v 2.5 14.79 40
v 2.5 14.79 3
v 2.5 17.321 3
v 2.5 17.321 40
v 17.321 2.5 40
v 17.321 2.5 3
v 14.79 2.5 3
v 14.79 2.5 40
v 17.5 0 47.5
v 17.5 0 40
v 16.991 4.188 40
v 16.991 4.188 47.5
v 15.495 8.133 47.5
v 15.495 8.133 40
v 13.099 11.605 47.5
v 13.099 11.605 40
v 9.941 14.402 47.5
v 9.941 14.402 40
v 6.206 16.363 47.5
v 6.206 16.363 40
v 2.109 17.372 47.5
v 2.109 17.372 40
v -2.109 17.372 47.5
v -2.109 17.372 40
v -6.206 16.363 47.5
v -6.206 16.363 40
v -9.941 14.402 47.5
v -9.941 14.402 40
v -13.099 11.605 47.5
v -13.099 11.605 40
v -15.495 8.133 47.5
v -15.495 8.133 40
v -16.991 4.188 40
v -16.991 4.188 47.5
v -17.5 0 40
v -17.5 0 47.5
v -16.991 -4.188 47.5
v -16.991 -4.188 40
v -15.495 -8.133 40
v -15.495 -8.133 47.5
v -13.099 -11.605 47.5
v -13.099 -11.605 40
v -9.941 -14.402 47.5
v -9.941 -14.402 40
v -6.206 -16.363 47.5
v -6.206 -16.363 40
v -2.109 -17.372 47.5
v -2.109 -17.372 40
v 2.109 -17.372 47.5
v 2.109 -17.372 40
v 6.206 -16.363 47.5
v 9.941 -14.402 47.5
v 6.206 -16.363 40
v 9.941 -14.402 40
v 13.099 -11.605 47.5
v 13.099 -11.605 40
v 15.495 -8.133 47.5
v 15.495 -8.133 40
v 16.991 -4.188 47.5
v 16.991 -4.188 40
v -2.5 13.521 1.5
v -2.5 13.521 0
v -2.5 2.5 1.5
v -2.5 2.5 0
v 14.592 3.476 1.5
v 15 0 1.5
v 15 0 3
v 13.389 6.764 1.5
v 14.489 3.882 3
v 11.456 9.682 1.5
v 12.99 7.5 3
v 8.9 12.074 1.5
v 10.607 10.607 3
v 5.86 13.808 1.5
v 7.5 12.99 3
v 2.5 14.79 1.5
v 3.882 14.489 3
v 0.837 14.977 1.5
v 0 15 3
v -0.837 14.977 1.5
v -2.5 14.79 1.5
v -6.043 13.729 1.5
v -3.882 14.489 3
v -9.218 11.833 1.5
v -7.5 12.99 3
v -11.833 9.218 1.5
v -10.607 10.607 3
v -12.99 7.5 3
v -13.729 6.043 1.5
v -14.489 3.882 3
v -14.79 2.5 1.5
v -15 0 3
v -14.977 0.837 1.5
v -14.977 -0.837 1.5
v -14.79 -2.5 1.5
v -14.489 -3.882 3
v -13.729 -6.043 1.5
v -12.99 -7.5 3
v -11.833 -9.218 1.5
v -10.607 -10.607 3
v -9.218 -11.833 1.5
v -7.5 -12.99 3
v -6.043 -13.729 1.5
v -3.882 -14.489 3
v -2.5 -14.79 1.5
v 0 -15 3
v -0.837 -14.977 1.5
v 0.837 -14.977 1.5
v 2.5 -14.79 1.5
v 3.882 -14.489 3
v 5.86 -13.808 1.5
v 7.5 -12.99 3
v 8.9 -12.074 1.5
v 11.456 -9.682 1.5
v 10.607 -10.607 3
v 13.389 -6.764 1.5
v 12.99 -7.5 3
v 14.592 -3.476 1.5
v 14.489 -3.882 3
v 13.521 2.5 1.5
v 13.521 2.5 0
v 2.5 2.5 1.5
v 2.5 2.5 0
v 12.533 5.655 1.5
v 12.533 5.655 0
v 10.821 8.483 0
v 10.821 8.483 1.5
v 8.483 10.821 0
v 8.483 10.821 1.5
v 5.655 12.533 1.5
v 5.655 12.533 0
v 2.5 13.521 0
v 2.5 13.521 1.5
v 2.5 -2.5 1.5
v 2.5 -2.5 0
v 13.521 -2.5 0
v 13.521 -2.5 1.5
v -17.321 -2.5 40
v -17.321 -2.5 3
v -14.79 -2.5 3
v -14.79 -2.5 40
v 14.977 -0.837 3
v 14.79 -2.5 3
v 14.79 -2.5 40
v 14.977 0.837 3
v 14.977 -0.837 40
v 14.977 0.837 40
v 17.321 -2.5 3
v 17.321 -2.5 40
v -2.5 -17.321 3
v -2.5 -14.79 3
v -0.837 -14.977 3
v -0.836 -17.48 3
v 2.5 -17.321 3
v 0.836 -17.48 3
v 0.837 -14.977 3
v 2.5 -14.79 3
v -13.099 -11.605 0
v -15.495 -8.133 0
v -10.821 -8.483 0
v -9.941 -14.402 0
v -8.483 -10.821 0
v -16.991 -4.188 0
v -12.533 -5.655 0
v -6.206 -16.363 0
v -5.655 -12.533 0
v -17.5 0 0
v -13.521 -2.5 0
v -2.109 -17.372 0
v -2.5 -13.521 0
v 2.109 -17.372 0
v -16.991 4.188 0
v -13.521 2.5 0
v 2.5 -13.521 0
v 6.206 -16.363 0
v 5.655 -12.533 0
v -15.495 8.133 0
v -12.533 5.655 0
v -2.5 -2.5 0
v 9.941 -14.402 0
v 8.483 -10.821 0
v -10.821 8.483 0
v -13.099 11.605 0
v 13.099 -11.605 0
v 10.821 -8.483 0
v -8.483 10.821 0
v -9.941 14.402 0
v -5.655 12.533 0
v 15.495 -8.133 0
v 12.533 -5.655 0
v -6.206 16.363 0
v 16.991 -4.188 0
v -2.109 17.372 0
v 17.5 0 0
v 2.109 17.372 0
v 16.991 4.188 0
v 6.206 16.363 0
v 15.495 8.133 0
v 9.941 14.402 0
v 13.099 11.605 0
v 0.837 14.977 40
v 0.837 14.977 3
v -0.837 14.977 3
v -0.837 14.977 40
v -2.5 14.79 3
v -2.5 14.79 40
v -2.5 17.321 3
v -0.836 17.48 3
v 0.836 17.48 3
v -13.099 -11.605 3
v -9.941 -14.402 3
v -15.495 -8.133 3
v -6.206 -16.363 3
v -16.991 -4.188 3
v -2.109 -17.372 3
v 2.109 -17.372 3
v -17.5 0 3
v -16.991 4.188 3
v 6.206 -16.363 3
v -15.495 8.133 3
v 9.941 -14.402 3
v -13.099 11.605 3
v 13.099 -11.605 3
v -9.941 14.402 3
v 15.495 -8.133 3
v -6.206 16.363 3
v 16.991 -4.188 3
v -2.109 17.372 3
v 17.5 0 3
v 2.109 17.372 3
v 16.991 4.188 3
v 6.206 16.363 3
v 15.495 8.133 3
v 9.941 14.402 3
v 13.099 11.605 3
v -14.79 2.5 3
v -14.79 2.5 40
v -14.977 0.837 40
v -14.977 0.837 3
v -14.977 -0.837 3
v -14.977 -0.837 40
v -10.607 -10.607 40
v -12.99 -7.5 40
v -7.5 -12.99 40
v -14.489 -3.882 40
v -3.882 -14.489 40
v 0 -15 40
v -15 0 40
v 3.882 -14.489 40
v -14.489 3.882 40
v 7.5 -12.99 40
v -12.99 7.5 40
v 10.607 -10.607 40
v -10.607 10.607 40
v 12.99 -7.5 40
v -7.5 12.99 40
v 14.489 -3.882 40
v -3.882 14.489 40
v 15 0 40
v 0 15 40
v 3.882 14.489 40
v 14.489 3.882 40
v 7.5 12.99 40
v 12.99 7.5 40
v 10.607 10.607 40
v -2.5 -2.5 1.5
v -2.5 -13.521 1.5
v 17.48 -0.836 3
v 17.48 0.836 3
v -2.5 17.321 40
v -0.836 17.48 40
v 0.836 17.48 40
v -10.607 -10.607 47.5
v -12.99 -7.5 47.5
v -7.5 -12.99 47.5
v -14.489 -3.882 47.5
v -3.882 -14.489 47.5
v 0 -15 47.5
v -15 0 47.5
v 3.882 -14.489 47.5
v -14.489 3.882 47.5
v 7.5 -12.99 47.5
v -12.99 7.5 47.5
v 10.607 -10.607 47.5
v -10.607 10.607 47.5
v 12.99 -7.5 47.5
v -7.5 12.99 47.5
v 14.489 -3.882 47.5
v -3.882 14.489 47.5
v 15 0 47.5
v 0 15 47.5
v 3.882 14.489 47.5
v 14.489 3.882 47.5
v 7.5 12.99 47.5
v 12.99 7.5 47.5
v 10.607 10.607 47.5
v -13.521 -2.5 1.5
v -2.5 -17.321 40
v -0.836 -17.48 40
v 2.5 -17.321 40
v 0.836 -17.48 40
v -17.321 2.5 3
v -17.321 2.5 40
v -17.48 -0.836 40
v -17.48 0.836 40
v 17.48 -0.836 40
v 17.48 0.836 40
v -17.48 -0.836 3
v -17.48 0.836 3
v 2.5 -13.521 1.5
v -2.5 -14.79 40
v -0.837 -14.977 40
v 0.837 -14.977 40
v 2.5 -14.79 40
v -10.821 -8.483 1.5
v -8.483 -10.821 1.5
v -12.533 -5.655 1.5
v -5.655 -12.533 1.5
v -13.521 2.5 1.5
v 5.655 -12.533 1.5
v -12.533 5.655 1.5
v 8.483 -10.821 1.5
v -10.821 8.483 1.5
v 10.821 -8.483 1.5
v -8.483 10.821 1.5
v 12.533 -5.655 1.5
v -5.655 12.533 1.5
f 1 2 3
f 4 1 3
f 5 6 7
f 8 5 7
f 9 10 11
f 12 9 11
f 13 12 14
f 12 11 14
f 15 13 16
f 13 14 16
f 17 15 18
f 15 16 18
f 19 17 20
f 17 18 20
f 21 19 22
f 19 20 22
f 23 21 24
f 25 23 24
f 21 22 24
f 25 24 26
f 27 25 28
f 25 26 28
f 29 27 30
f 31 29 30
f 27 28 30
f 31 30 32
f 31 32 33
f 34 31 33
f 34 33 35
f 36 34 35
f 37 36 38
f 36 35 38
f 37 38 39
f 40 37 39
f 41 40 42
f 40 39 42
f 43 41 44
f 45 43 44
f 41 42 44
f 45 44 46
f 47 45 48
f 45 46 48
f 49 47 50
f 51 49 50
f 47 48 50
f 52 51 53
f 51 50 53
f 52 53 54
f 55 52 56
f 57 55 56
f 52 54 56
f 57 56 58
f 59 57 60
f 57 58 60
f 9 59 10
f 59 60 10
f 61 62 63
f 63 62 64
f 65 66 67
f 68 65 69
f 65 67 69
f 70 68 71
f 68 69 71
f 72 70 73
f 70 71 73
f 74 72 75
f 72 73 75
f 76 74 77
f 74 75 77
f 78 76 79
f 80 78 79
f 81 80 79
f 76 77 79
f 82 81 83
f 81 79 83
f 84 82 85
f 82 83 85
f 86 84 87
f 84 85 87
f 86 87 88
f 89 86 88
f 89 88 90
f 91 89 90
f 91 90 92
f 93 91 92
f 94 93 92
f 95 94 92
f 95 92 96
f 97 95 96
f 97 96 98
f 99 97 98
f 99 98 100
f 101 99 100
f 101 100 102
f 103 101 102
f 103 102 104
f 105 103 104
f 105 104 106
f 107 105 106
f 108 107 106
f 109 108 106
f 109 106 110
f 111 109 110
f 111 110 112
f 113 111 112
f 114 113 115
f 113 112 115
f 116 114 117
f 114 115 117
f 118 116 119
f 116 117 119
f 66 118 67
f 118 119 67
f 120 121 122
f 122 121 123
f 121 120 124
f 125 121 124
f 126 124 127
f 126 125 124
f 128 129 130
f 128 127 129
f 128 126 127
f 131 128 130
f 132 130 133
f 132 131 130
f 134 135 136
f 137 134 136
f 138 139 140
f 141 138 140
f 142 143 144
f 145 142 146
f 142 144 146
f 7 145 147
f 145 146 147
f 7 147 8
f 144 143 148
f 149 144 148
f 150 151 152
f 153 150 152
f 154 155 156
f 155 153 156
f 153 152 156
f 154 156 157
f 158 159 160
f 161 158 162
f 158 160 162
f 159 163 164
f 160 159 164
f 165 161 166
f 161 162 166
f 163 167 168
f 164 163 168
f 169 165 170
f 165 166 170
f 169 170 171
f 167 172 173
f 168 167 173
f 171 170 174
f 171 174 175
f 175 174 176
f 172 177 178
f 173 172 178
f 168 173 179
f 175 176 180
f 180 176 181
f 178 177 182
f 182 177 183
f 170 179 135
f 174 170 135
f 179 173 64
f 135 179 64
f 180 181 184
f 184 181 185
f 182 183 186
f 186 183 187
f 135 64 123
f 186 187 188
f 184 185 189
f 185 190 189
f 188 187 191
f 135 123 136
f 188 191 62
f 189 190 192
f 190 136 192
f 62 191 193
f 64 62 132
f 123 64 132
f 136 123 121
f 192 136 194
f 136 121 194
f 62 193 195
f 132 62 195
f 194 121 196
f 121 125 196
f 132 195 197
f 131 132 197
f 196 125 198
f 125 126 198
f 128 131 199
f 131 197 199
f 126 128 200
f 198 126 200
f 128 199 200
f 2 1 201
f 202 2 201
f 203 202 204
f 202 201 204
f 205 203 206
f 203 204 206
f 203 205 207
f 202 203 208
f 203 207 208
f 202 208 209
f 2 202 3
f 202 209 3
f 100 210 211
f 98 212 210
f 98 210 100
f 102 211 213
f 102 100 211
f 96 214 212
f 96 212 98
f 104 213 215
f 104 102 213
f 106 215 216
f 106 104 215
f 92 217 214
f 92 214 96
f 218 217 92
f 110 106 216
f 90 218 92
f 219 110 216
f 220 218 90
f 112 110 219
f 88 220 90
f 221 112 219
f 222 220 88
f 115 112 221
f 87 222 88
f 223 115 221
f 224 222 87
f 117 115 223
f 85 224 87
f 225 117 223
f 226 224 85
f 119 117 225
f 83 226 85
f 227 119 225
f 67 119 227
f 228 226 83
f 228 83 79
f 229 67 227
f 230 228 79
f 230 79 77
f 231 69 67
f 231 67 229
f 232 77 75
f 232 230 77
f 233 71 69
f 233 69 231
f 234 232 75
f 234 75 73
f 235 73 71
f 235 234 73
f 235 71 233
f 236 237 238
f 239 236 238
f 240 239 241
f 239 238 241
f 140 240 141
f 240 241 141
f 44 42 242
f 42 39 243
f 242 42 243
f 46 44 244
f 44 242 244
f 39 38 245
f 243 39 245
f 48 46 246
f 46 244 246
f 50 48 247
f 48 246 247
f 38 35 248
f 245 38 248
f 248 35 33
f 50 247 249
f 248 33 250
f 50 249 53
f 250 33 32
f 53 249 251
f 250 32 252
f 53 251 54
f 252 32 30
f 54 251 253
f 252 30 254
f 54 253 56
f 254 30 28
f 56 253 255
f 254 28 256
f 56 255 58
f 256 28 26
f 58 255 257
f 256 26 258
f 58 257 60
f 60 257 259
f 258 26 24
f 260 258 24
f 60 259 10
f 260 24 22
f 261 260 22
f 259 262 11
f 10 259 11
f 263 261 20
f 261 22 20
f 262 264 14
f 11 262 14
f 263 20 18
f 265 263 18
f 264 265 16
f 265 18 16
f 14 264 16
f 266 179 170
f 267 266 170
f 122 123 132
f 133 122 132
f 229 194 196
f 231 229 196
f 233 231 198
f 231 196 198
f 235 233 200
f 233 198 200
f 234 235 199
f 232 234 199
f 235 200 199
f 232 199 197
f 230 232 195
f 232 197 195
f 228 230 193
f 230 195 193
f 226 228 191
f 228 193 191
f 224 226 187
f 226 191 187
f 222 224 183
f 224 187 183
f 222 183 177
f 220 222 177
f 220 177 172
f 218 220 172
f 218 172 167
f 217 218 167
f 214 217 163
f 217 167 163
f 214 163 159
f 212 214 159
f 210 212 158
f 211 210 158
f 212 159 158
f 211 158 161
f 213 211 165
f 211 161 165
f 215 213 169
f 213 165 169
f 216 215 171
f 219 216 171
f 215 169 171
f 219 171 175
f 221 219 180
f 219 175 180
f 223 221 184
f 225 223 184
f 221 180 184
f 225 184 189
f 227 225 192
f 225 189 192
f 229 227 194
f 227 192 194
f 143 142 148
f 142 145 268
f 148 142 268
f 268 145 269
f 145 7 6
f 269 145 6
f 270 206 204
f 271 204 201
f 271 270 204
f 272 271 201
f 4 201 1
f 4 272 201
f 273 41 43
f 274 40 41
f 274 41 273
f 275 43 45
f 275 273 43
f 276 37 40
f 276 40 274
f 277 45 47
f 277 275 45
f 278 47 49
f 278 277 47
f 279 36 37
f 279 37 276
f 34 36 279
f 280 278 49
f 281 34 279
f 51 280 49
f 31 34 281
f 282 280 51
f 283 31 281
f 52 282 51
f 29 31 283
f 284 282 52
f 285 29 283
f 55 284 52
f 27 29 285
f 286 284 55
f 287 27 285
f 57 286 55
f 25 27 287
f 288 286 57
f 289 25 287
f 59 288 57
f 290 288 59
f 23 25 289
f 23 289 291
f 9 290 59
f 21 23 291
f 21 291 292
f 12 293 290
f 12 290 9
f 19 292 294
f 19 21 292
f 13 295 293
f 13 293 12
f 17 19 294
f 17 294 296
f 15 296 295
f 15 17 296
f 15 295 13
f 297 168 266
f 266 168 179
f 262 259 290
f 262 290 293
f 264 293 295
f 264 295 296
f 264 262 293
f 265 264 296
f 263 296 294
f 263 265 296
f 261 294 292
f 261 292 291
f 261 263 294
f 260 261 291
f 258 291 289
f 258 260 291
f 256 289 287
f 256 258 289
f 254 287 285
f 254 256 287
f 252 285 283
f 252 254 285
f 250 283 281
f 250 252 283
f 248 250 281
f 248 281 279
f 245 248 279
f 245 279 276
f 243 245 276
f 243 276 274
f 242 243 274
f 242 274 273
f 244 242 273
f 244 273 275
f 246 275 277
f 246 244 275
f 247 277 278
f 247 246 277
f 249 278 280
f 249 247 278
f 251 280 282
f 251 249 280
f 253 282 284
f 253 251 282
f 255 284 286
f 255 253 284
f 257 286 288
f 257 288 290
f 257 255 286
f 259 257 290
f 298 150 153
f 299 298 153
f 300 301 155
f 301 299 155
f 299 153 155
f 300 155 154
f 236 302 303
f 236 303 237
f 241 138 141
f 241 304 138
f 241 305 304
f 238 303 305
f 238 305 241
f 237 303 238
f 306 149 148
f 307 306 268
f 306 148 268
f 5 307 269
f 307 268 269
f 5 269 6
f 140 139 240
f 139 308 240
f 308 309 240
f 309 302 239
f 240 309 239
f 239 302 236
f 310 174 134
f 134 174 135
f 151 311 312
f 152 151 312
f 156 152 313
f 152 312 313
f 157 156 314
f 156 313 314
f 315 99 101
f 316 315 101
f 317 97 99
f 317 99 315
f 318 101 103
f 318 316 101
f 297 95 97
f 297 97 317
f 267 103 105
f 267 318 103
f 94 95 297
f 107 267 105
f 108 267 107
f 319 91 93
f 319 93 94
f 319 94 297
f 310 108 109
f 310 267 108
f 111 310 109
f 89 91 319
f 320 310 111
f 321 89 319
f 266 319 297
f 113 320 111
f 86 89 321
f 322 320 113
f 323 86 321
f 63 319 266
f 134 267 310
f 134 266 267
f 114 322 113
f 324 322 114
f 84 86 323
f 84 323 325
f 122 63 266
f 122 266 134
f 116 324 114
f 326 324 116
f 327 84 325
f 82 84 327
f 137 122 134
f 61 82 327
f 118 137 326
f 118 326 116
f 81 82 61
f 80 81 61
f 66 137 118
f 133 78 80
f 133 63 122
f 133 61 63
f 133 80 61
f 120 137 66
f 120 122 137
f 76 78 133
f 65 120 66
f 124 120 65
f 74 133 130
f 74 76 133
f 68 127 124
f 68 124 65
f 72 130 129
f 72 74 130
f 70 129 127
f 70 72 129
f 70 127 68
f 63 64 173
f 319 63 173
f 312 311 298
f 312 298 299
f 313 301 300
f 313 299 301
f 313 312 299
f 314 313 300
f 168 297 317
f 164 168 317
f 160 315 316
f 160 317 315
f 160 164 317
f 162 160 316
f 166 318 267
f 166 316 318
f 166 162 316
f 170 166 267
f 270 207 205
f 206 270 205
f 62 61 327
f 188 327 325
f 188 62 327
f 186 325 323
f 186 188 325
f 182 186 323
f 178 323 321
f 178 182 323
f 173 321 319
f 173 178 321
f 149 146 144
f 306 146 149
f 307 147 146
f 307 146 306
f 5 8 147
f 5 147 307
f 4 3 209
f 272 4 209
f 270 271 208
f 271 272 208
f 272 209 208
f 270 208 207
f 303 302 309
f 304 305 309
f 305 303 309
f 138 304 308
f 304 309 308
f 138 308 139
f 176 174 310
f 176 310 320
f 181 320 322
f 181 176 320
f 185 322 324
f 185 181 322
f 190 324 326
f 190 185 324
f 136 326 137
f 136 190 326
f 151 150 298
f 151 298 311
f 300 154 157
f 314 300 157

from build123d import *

# Parameters (mm, degrees)
F0_R      = 17.5
F0_R_2    = 13.75
F1_DEPTH  = 43
F2_R      = 15
F2_R_2    = 13.75
F3_DEPTH  = 41.5
F5_W      = 34.3430949748
F5_H      = 5
F5_W_2    = 5
F5_H_2    = 31.6730713844
F6_DEPTH  = 37
F7_R      = 17.5
F7_R_2    = 13.75
F8_DEPTH  = 3
F10_R     = 17.5
F10_R_2   = 15
F11_DEPTH = 7.5
F12_R     = 15
F13_DEPTH = 1.5
F14_W     = 5
F14_H     = 5
F15_DEPTH = 1.5


with BuildPart() as f1:
    # F0 (on Top) → F1 (new body)
    with BuildSketch(Plane.XY):
        Circle(F0_R)
        Circle(F0_R_2, mode=Mode.SUBTRACT)
    extrude(amount=F1_DEPTH)

    # F2 (on face) → F3 (cut)
    with BuildSketch(Plane.XY.offset(43)):
        Circle(F2_R)
        Circle(F2_R_2, mode=Mode.SUBTRACT)
    extrude(amount=-F3_DEPTH, mode=Mode.SUBTRACT)

    # F5 (on offset) → F6 (intersect)
    with BuildSketch(Plane.XY.offset(3)):
        with Locations((19.6715474874, 0)):
            Rectangle(F5_W, F5_H)
        Rectangle(F5_W_2, F5_H)
        with Locations((0, 18.3365356922)):
            Rectangle(F5_W_2, F5_H_2)
        with Locations((-19.6715474874, 0)):
            Rectangle(F5_W, F5_H)
        with Locations((0, -18.3365356922)):
            Rectangle(F5_W_2, F5_H_2)
    extrude(amount=F6_DEPTH, mode=Mode.INTERSECT)


with BuildPart() as f8:
    # F7 (on Top) → F8 (new body)
    with BuildSketch(Plane.XY):
        Circle(F7_R)
        Circle(F7_R_2, mode=Mode.SUBTRACT)
    extrude(amount=F8_DEPTH)

    # F12 (on face) → F13 (cut)
    with BuildSketch(Plane.XY.offset(3)):
        Circle(F12_R)
    extrude(amount=-F13_DEPTH, mode=Mode.SUBTRACT)

    # F14 (on Top) → F15 (join)
    with BuildSketch(Plane.XY):
        with BuildLine():
            ThreePointArc((14.7901994577, -2.5), (14.9474578418, -1.2543939042), (15, 0))
            ThreePointArc((15, 0), (14.9474578418, 1.2543939042), (14.7901994577, 2.5))
            Line((14.7901994577, 2.5), (2.5, 2.5))
            Line((2.5, 2.5), (2.5, -2.5))
            Line((2.5, -2.5), (14.7901994577, -2.5))
        make_face()
        Rectangle(F14_W, F14_H)
        with BuildLine():
            Line((2.5, 2.5), (2.5, 14.7901994577))
            ThreePointArc((2.5, 14.7901994577), (0, 15), (-2.5, 14.7901994577))
            Line((-2.5, 14.7901994577), (-2.5, 2.5))
            Line((-2.5, 2.5), (2.5, 2.5))
        make_face()
        with BuildLine():
            ThreePointArc((-2.5, -14.7901994577), (0, -15), (2.5, -14.7901994577))
            Line((2.5, -14.7901994577), (2.5, -2.5))
            Line((2.5, -2.5), (-2.5, -2.5))
            Line((-2.5, -2.5), (-2.5, -14.7901994577))
        make_face()
        with BuildLine():
            Line((-2.5, -2.5), (-2.5, 2.5))
            Line((-2.5, 2.5), (-14.7901994577, 2.5))
            ThreePointArc((-14.7901994577, 2.5), (-15, 0), (-14.7901994577, -2.5))
            Line((-14.7901994577, -2.5), (-2.5, -2.5))
        make_face()
    extrude(amount=F15_DEPTH)


with BuildPart() as f11:
    # F10 (on offset) → F11 (new body)
    with BuildSketch(Plane.XY.offset(40)):
        Circle(F10_R)
        Circle(F10_R_2, mode=Mode.SUBTRACT)
    extrude(amount=F11_DEPTH)


solid = Compound([f1.part, f8.part, f11.part])
